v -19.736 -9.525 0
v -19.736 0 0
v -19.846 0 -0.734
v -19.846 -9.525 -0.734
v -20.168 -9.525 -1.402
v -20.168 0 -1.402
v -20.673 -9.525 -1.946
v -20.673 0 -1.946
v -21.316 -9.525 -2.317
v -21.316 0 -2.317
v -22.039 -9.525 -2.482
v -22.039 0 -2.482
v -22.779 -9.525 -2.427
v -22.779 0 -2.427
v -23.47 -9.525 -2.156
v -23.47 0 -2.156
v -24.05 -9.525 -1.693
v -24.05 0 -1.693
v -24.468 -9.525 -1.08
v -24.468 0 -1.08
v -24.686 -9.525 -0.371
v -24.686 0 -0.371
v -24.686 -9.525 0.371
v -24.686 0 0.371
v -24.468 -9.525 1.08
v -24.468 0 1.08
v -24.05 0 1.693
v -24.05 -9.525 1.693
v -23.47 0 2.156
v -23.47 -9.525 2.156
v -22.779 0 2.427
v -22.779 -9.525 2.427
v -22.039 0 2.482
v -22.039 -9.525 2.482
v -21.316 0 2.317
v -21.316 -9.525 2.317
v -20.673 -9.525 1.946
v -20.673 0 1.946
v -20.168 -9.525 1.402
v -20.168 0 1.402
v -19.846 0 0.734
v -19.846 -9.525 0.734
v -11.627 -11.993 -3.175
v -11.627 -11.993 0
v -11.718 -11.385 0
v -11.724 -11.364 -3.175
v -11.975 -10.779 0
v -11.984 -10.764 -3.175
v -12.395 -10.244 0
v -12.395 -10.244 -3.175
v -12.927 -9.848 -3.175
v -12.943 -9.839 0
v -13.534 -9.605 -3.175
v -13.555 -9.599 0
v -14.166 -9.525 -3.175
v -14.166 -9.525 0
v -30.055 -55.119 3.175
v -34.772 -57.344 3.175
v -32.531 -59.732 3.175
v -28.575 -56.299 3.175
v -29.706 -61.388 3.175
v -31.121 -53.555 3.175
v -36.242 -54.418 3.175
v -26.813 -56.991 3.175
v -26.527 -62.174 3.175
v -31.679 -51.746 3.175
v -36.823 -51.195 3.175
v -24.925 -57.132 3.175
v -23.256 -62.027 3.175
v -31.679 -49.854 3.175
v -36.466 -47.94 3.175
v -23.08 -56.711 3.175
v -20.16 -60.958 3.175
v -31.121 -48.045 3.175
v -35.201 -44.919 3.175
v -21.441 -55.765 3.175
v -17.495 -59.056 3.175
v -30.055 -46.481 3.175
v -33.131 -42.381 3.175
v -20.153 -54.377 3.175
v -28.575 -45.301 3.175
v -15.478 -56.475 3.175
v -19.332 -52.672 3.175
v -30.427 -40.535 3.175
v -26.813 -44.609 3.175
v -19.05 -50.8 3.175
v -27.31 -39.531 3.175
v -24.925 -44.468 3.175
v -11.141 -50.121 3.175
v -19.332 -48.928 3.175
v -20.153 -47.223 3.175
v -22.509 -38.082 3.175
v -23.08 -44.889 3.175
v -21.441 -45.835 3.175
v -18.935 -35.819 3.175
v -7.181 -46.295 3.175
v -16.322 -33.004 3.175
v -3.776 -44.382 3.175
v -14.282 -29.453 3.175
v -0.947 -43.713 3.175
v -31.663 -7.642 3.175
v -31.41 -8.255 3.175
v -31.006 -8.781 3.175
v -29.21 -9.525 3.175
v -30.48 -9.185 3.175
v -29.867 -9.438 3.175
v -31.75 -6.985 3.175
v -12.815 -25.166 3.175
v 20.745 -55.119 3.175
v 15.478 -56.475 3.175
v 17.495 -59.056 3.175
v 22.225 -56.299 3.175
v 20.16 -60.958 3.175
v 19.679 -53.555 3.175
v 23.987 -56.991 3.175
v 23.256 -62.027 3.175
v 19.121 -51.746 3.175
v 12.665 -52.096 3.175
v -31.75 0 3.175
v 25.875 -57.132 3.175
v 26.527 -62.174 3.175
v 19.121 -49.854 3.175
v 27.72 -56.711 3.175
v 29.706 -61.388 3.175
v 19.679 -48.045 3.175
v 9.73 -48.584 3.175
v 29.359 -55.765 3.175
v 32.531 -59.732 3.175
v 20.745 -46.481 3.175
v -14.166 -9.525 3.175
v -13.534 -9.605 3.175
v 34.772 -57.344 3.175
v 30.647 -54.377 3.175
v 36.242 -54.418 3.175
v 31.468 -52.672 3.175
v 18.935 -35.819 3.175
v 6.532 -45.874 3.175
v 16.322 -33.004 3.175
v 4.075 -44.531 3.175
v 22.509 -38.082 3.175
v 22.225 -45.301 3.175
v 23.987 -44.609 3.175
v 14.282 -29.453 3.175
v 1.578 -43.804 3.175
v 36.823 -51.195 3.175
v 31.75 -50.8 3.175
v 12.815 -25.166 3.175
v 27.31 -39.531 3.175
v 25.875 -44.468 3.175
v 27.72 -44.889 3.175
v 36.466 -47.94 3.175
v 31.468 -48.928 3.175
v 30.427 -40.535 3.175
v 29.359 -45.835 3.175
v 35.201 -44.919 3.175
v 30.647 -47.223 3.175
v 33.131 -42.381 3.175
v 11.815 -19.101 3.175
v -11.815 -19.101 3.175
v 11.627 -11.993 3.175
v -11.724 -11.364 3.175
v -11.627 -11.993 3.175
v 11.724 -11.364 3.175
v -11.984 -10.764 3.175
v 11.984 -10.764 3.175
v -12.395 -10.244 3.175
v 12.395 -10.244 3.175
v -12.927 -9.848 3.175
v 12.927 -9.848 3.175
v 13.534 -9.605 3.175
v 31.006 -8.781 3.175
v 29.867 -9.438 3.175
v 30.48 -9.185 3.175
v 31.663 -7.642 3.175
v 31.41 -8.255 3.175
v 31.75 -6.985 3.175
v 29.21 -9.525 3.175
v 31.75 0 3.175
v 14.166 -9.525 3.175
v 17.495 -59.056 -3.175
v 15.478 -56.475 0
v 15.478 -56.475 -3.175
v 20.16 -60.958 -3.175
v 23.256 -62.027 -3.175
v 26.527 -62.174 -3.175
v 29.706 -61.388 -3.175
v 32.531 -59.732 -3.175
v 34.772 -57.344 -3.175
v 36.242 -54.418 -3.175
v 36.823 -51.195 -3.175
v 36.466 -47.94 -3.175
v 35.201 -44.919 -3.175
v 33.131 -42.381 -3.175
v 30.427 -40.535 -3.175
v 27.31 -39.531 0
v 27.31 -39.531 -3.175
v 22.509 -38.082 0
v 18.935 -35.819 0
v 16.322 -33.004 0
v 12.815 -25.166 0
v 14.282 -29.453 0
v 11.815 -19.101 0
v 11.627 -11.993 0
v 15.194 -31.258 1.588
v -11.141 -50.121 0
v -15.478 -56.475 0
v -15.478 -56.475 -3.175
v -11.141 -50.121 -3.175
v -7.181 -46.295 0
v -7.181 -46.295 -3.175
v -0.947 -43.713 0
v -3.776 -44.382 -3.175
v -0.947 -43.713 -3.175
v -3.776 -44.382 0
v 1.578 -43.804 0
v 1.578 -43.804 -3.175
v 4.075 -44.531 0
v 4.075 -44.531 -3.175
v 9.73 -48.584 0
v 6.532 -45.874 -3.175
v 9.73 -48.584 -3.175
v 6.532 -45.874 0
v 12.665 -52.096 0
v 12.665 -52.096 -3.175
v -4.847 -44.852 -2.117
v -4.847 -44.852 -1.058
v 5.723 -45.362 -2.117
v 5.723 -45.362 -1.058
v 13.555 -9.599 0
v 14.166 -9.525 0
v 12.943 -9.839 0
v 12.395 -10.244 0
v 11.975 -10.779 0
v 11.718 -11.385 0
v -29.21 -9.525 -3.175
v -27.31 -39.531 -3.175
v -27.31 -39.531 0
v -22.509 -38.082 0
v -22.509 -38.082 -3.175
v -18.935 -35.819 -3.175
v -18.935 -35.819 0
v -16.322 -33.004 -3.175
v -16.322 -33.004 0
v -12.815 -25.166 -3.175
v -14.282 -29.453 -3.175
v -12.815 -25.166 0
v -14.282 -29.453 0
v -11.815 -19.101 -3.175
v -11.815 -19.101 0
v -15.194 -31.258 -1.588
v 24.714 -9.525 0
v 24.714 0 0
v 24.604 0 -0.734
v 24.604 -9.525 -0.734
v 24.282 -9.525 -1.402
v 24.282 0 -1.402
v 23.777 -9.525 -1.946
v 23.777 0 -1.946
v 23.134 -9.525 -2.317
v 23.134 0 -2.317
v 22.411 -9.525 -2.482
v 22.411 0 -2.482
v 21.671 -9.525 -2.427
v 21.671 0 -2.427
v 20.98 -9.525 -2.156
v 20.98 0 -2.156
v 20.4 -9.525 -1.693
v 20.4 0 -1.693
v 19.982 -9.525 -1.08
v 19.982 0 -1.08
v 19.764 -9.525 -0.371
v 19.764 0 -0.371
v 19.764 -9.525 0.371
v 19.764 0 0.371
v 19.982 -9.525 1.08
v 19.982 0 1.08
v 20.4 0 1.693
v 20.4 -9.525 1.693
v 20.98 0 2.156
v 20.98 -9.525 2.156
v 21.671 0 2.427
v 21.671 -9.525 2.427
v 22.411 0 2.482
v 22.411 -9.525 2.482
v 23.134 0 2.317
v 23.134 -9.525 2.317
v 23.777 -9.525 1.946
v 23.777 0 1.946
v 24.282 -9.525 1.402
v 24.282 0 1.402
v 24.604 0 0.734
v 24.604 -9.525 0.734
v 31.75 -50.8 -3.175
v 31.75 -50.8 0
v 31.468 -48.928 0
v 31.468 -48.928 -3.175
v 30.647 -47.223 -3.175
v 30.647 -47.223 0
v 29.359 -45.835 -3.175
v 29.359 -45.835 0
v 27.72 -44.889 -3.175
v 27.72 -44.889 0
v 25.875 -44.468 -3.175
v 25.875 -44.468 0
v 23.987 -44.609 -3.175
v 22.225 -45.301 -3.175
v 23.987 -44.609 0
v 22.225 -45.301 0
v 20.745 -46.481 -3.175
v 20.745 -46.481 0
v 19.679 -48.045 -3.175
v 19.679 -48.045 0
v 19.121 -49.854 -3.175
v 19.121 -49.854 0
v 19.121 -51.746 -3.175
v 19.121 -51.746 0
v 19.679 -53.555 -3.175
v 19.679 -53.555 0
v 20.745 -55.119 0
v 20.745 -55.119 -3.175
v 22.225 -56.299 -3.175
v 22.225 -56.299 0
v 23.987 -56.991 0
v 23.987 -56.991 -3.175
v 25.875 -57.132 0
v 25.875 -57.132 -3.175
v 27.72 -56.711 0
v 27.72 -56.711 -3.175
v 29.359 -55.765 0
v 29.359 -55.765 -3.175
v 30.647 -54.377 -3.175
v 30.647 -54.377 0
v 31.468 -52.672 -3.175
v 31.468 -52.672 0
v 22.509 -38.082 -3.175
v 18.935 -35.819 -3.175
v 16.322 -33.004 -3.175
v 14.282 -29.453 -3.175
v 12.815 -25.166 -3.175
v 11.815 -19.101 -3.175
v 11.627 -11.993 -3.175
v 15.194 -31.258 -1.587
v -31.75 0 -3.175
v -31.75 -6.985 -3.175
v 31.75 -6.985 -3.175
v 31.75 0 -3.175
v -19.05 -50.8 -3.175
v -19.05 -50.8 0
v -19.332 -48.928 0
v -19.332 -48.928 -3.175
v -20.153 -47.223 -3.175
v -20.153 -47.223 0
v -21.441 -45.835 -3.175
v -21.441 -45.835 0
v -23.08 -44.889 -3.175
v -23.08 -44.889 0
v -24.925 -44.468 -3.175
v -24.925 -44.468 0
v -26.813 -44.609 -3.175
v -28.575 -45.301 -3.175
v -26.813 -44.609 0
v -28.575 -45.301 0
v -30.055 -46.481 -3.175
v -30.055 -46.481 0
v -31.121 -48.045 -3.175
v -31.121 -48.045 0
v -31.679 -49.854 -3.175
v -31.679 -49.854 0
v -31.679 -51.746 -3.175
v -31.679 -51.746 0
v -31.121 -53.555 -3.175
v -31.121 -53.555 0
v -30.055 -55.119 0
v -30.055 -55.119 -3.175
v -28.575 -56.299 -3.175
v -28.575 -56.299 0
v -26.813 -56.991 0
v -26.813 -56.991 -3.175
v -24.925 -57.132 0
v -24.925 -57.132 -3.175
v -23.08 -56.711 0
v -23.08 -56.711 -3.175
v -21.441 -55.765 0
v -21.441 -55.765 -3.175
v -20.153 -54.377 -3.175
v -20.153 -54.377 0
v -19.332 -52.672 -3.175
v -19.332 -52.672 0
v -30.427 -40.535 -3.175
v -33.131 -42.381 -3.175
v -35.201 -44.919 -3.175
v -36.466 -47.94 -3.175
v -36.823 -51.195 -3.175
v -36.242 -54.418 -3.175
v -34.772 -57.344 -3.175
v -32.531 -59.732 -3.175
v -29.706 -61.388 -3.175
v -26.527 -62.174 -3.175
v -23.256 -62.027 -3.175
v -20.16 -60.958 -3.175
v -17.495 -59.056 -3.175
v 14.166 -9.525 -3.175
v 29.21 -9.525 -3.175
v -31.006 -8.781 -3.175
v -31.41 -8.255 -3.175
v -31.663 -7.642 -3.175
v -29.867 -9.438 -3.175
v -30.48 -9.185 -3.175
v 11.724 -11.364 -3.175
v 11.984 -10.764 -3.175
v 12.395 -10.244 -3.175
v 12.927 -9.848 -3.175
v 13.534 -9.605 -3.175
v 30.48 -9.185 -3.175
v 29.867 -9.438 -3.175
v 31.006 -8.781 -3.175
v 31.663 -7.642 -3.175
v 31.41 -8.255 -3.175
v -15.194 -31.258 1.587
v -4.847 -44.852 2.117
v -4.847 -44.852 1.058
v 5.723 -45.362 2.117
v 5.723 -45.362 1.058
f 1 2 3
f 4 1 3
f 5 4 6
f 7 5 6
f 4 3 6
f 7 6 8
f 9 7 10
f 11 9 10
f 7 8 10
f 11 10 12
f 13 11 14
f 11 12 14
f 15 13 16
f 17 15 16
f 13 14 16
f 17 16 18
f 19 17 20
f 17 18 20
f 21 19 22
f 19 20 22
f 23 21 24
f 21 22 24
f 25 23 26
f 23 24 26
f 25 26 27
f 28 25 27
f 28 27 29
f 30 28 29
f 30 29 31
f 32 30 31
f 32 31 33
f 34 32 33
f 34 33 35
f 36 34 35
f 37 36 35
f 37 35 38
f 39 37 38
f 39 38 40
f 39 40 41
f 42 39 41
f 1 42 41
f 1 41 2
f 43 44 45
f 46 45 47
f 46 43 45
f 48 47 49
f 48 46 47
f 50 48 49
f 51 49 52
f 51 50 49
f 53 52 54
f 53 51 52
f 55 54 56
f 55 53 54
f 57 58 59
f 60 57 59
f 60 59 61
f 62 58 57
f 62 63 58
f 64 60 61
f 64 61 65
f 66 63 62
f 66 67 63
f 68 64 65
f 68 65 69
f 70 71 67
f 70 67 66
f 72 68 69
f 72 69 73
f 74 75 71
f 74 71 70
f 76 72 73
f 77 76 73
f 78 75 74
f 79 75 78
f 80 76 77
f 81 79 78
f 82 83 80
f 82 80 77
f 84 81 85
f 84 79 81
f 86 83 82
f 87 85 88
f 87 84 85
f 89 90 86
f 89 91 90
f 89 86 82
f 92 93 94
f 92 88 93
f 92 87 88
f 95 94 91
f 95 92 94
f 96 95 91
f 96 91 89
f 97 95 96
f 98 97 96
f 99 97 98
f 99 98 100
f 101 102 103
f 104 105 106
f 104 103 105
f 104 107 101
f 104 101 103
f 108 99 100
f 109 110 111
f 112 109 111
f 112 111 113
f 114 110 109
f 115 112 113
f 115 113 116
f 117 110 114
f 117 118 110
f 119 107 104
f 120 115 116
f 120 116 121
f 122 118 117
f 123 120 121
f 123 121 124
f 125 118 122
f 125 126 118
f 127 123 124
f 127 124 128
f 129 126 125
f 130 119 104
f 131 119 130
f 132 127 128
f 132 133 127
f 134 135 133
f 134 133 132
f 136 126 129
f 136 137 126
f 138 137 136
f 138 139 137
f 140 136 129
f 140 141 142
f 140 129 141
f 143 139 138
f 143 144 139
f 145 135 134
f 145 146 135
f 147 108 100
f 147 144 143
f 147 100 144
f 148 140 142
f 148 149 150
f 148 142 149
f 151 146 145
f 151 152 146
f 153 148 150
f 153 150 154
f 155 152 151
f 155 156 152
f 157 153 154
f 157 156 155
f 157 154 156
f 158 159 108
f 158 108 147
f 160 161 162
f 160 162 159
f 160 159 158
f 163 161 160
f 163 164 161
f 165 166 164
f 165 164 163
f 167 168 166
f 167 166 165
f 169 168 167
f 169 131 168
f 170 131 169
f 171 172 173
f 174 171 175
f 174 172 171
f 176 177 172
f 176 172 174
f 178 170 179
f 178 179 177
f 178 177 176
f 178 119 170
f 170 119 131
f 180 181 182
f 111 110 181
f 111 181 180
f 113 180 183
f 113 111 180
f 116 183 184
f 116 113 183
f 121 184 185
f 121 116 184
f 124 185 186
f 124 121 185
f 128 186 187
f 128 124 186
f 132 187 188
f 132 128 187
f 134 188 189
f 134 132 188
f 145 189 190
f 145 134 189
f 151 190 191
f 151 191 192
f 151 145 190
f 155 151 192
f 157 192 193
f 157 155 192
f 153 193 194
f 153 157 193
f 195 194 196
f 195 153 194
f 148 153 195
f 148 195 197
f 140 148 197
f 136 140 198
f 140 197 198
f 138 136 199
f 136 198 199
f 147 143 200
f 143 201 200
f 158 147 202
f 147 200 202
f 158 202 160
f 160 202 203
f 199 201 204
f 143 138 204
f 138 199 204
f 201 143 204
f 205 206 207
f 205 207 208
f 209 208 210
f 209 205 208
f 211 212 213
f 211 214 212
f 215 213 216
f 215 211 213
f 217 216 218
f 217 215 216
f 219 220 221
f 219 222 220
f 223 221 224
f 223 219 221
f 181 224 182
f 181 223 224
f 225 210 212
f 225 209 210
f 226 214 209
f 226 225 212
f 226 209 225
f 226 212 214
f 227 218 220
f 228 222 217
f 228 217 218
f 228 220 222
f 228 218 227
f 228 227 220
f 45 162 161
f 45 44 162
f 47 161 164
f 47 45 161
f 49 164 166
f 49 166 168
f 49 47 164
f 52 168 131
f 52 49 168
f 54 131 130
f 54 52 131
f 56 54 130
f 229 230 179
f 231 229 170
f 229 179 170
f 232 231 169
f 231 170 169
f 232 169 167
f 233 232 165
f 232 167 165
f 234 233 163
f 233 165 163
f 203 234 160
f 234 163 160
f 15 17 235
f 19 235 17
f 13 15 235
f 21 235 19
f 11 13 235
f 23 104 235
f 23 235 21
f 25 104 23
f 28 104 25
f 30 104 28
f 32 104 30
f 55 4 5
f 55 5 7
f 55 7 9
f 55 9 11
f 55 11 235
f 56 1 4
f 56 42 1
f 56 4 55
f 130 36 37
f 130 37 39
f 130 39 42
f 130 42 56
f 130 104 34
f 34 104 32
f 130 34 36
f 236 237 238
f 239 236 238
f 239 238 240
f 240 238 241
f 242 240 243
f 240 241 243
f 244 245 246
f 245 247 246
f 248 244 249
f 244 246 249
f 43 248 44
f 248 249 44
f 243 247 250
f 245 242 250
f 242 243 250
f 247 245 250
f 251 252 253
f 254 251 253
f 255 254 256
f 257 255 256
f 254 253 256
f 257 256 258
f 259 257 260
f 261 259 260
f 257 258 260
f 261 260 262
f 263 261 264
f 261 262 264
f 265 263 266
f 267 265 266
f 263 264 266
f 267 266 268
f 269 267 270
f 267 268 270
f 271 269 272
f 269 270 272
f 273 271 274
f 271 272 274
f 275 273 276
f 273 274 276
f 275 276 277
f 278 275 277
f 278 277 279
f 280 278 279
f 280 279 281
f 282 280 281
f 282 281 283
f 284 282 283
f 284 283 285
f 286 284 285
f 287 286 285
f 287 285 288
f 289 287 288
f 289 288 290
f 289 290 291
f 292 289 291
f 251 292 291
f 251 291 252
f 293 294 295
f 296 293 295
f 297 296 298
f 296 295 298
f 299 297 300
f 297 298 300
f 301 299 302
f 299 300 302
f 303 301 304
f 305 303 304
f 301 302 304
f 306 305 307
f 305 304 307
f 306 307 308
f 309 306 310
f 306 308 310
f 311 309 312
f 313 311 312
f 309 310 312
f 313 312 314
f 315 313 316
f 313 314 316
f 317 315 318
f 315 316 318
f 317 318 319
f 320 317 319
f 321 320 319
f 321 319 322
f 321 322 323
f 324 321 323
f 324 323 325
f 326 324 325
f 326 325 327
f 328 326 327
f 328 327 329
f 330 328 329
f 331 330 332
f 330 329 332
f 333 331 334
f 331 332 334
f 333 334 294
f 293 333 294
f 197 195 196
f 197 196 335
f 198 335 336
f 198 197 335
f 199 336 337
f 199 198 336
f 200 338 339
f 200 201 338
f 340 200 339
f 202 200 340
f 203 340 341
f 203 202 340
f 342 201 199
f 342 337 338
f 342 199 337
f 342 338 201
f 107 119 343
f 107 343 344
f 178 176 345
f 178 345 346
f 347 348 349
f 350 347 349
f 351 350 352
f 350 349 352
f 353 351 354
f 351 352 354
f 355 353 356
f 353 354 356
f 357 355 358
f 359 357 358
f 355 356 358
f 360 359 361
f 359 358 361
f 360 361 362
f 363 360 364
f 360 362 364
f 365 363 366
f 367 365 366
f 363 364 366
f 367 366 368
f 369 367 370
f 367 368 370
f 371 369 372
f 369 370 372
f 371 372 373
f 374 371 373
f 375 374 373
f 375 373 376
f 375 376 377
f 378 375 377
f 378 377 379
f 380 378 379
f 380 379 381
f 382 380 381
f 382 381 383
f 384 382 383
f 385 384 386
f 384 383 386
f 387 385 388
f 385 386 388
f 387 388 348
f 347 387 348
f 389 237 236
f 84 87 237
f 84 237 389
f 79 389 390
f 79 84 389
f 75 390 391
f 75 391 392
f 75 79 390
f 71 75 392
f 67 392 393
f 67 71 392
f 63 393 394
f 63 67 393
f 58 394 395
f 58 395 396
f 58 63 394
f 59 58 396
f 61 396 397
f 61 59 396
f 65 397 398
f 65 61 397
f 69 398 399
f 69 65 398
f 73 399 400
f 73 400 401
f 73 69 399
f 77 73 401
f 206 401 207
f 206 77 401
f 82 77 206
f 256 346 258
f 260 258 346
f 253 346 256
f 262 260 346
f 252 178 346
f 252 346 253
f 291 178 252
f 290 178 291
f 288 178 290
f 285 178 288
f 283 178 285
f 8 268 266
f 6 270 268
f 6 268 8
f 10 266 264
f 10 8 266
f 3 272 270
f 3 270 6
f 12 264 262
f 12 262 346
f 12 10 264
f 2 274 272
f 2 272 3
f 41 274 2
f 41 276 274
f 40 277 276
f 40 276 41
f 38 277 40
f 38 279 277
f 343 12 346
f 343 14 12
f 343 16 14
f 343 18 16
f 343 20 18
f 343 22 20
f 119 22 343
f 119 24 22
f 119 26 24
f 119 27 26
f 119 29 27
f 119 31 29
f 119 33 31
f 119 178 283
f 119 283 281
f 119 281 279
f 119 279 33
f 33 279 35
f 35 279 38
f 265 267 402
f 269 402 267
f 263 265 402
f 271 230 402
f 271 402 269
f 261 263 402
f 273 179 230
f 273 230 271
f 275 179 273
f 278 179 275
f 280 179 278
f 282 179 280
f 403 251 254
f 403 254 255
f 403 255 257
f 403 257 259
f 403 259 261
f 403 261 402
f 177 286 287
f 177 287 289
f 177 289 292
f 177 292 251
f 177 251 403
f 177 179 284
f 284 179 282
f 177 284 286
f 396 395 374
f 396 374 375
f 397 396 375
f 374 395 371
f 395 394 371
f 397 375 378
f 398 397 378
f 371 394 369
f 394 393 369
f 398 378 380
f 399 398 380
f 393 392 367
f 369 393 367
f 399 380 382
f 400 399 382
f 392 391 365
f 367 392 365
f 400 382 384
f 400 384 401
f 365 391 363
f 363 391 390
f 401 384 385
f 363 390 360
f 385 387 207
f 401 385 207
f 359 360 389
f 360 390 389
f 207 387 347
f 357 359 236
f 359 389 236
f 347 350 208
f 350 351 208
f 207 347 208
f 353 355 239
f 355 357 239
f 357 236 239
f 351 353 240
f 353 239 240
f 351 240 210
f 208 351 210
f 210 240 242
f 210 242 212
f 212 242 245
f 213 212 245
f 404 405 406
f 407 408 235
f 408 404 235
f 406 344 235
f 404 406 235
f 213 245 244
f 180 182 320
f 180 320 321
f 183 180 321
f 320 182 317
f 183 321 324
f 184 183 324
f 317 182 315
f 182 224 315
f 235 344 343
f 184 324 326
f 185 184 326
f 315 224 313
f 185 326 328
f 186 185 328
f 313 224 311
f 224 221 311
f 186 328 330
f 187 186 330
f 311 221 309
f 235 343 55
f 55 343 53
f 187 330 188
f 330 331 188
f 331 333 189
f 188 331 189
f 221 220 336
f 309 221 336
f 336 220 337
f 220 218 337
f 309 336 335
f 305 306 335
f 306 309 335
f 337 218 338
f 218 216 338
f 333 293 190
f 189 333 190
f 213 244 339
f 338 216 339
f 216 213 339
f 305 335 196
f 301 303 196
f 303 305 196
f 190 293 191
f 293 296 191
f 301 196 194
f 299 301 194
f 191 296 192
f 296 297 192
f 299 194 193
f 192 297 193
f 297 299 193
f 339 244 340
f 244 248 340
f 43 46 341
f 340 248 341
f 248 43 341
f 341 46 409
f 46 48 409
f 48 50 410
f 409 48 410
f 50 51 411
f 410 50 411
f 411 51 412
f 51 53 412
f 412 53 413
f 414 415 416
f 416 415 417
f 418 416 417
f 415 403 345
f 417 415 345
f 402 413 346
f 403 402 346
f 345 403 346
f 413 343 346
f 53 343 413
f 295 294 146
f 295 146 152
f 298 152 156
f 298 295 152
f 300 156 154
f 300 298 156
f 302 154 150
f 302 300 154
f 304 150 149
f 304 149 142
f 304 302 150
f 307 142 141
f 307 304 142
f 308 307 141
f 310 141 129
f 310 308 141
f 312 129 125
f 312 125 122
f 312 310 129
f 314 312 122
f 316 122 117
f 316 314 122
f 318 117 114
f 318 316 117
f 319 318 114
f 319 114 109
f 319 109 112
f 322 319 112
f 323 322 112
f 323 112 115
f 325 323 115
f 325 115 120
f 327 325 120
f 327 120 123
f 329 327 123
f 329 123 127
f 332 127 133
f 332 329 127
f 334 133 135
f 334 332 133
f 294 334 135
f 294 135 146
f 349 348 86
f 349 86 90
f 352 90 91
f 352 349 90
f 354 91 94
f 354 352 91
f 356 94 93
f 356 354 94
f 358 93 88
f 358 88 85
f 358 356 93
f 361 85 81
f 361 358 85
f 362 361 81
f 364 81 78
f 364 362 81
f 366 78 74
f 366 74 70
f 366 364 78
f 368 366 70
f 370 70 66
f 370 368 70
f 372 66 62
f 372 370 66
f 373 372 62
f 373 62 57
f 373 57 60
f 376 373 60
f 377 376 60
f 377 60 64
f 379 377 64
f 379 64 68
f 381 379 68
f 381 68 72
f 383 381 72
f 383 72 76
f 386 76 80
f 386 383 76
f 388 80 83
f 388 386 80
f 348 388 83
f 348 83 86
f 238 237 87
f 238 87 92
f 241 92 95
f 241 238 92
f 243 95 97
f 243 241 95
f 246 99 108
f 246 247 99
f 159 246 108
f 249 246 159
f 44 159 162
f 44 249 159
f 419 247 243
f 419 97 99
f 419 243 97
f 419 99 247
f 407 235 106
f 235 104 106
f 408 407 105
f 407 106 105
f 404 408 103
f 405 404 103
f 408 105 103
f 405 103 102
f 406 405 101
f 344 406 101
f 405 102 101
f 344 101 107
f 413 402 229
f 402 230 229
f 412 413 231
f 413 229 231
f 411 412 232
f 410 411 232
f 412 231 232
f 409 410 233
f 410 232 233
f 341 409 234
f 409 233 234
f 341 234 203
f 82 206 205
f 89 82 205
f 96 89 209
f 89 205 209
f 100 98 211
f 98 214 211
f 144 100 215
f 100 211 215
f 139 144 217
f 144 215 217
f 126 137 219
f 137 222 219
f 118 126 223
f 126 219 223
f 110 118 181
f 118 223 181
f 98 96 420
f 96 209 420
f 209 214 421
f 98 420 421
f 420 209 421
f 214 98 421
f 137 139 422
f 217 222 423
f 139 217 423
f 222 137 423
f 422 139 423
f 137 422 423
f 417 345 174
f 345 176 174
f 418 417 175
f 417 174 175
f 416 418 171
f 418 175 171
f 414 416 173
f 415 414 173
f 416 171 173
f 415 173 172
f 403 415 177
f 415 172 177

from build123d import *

# Parameters (mm, degrees)
SKETCH1_R                  = 11.43
SKETCH1_R_2                = 6.35
BOSS_EXTRUDE1_DEPTH        = 3.175
FILLET1_R                  = 2.54
F_10_CLEARANCE_HOLE1_D     = 4.9784
F_10_CLEARANCE_HOLE1_DEPTH = 9.525


with BuildPart() as part:
    # Sketch1 → Boss-Extrude1 (new, symmetric)
    # profile 1 of 3: a face of its own
    with BuildSketch(Plane.XY):
        with BuildLine():
            Line((31.75, -9.525), (31.75, 0))
            Line((31.75, 0), (-31.75, 0))
            Line((-31.75, 0), (-31.75, -9.525))
            Line((-31.75, -9.525), (-11.736070368, -9.525))
            add(Edge.make_bspline(
                [(-27.309712652, -39.53066561), (-10.121441585, -36.617924041), (-11.736070368, -9.525)],
                knots=[0, 0, 0, 1, 1, 1], degree=2))
            ThreePointArc((-27.309712652, -39.53066561), (-18.023792154, -42.06865086), (-13.97, -50.8))
            ThreePointArc((-13.97, -50.8), (-14.353544724, -53.736107258), (-15.478438466, -56.47516667))
            add(Edge.make_bspline(
                [(-15.478438466, -56.47516667), (-5.067830393, -38.274910251), (6.38081654, -40.57032704), (15.478438466, -56.47516667)],
                knots=[0, 0, 0, 0, 1, 1, 1, 1], degree=3))
            ThreePointArc((15.478438466, -56.47516667), (16.028422776, -44.256419914), (27.309712652, -39.53066561))
            add(Edge.make_bspline(
                [(27.309712652, -39.53066561), (10.121441585, -36.617924041), (11.736070368, -9.525)],
                knots=[0, 0, 0, 1, 1, 1], degree=2))
            Line((11.736070368, -9.525), (31.75, -9.525))
        make_face()
    # profile 2 of 3: a face of its own
    with BuildSketch(Plane.XY):
        with Locations((-25.4, -50.8)):
            Circle(SKETCH1_R)
        with Locations((-25.4, -50.8)):
            Circle(SKETCH1_R_2, mode=Mode.SUBTRACT)
    # profile 3 of 3: a face of its own
    with BuildSketch(Plane.XY):
        with Locations((25.4, -50.8)):
            Circle(SKETCH1_R)
        with Locations((25.4, -50.8)):
            Circle(SKETCH1_R_2, mode=Mode.SUBTRACT)
    extrude(amount=BOSS_EXTRUDE1_DEPTH, both=True)

    # Fillet1
    fillet1_edges = [part.edges().sort_by_distance(p)[0] for p in [
        (-11.736070368, -9.525, -1.5875),
        (-31.75, -9.525, 0),
        (31.75, -9.525, 0),
        (11.736070368, -9.525, 1.5875),
    ]]
    fillet(fillet1_edges, radius=FILLET1_R)

    # #10 Clearance Hole1
    with Locations(Plane(origin=(0, -9.525, 0), x_dir=(-1, 0, 0), z_dir=(0, -1, 0))):
        with Locations((22.225, 0), (-22.225, 0)):
            Hole(F_10_CLEARANCE_HOLE1_D / 2, depth=F_10_CLEARANCE_HOLE1_DEPTH)


solid = part.part
